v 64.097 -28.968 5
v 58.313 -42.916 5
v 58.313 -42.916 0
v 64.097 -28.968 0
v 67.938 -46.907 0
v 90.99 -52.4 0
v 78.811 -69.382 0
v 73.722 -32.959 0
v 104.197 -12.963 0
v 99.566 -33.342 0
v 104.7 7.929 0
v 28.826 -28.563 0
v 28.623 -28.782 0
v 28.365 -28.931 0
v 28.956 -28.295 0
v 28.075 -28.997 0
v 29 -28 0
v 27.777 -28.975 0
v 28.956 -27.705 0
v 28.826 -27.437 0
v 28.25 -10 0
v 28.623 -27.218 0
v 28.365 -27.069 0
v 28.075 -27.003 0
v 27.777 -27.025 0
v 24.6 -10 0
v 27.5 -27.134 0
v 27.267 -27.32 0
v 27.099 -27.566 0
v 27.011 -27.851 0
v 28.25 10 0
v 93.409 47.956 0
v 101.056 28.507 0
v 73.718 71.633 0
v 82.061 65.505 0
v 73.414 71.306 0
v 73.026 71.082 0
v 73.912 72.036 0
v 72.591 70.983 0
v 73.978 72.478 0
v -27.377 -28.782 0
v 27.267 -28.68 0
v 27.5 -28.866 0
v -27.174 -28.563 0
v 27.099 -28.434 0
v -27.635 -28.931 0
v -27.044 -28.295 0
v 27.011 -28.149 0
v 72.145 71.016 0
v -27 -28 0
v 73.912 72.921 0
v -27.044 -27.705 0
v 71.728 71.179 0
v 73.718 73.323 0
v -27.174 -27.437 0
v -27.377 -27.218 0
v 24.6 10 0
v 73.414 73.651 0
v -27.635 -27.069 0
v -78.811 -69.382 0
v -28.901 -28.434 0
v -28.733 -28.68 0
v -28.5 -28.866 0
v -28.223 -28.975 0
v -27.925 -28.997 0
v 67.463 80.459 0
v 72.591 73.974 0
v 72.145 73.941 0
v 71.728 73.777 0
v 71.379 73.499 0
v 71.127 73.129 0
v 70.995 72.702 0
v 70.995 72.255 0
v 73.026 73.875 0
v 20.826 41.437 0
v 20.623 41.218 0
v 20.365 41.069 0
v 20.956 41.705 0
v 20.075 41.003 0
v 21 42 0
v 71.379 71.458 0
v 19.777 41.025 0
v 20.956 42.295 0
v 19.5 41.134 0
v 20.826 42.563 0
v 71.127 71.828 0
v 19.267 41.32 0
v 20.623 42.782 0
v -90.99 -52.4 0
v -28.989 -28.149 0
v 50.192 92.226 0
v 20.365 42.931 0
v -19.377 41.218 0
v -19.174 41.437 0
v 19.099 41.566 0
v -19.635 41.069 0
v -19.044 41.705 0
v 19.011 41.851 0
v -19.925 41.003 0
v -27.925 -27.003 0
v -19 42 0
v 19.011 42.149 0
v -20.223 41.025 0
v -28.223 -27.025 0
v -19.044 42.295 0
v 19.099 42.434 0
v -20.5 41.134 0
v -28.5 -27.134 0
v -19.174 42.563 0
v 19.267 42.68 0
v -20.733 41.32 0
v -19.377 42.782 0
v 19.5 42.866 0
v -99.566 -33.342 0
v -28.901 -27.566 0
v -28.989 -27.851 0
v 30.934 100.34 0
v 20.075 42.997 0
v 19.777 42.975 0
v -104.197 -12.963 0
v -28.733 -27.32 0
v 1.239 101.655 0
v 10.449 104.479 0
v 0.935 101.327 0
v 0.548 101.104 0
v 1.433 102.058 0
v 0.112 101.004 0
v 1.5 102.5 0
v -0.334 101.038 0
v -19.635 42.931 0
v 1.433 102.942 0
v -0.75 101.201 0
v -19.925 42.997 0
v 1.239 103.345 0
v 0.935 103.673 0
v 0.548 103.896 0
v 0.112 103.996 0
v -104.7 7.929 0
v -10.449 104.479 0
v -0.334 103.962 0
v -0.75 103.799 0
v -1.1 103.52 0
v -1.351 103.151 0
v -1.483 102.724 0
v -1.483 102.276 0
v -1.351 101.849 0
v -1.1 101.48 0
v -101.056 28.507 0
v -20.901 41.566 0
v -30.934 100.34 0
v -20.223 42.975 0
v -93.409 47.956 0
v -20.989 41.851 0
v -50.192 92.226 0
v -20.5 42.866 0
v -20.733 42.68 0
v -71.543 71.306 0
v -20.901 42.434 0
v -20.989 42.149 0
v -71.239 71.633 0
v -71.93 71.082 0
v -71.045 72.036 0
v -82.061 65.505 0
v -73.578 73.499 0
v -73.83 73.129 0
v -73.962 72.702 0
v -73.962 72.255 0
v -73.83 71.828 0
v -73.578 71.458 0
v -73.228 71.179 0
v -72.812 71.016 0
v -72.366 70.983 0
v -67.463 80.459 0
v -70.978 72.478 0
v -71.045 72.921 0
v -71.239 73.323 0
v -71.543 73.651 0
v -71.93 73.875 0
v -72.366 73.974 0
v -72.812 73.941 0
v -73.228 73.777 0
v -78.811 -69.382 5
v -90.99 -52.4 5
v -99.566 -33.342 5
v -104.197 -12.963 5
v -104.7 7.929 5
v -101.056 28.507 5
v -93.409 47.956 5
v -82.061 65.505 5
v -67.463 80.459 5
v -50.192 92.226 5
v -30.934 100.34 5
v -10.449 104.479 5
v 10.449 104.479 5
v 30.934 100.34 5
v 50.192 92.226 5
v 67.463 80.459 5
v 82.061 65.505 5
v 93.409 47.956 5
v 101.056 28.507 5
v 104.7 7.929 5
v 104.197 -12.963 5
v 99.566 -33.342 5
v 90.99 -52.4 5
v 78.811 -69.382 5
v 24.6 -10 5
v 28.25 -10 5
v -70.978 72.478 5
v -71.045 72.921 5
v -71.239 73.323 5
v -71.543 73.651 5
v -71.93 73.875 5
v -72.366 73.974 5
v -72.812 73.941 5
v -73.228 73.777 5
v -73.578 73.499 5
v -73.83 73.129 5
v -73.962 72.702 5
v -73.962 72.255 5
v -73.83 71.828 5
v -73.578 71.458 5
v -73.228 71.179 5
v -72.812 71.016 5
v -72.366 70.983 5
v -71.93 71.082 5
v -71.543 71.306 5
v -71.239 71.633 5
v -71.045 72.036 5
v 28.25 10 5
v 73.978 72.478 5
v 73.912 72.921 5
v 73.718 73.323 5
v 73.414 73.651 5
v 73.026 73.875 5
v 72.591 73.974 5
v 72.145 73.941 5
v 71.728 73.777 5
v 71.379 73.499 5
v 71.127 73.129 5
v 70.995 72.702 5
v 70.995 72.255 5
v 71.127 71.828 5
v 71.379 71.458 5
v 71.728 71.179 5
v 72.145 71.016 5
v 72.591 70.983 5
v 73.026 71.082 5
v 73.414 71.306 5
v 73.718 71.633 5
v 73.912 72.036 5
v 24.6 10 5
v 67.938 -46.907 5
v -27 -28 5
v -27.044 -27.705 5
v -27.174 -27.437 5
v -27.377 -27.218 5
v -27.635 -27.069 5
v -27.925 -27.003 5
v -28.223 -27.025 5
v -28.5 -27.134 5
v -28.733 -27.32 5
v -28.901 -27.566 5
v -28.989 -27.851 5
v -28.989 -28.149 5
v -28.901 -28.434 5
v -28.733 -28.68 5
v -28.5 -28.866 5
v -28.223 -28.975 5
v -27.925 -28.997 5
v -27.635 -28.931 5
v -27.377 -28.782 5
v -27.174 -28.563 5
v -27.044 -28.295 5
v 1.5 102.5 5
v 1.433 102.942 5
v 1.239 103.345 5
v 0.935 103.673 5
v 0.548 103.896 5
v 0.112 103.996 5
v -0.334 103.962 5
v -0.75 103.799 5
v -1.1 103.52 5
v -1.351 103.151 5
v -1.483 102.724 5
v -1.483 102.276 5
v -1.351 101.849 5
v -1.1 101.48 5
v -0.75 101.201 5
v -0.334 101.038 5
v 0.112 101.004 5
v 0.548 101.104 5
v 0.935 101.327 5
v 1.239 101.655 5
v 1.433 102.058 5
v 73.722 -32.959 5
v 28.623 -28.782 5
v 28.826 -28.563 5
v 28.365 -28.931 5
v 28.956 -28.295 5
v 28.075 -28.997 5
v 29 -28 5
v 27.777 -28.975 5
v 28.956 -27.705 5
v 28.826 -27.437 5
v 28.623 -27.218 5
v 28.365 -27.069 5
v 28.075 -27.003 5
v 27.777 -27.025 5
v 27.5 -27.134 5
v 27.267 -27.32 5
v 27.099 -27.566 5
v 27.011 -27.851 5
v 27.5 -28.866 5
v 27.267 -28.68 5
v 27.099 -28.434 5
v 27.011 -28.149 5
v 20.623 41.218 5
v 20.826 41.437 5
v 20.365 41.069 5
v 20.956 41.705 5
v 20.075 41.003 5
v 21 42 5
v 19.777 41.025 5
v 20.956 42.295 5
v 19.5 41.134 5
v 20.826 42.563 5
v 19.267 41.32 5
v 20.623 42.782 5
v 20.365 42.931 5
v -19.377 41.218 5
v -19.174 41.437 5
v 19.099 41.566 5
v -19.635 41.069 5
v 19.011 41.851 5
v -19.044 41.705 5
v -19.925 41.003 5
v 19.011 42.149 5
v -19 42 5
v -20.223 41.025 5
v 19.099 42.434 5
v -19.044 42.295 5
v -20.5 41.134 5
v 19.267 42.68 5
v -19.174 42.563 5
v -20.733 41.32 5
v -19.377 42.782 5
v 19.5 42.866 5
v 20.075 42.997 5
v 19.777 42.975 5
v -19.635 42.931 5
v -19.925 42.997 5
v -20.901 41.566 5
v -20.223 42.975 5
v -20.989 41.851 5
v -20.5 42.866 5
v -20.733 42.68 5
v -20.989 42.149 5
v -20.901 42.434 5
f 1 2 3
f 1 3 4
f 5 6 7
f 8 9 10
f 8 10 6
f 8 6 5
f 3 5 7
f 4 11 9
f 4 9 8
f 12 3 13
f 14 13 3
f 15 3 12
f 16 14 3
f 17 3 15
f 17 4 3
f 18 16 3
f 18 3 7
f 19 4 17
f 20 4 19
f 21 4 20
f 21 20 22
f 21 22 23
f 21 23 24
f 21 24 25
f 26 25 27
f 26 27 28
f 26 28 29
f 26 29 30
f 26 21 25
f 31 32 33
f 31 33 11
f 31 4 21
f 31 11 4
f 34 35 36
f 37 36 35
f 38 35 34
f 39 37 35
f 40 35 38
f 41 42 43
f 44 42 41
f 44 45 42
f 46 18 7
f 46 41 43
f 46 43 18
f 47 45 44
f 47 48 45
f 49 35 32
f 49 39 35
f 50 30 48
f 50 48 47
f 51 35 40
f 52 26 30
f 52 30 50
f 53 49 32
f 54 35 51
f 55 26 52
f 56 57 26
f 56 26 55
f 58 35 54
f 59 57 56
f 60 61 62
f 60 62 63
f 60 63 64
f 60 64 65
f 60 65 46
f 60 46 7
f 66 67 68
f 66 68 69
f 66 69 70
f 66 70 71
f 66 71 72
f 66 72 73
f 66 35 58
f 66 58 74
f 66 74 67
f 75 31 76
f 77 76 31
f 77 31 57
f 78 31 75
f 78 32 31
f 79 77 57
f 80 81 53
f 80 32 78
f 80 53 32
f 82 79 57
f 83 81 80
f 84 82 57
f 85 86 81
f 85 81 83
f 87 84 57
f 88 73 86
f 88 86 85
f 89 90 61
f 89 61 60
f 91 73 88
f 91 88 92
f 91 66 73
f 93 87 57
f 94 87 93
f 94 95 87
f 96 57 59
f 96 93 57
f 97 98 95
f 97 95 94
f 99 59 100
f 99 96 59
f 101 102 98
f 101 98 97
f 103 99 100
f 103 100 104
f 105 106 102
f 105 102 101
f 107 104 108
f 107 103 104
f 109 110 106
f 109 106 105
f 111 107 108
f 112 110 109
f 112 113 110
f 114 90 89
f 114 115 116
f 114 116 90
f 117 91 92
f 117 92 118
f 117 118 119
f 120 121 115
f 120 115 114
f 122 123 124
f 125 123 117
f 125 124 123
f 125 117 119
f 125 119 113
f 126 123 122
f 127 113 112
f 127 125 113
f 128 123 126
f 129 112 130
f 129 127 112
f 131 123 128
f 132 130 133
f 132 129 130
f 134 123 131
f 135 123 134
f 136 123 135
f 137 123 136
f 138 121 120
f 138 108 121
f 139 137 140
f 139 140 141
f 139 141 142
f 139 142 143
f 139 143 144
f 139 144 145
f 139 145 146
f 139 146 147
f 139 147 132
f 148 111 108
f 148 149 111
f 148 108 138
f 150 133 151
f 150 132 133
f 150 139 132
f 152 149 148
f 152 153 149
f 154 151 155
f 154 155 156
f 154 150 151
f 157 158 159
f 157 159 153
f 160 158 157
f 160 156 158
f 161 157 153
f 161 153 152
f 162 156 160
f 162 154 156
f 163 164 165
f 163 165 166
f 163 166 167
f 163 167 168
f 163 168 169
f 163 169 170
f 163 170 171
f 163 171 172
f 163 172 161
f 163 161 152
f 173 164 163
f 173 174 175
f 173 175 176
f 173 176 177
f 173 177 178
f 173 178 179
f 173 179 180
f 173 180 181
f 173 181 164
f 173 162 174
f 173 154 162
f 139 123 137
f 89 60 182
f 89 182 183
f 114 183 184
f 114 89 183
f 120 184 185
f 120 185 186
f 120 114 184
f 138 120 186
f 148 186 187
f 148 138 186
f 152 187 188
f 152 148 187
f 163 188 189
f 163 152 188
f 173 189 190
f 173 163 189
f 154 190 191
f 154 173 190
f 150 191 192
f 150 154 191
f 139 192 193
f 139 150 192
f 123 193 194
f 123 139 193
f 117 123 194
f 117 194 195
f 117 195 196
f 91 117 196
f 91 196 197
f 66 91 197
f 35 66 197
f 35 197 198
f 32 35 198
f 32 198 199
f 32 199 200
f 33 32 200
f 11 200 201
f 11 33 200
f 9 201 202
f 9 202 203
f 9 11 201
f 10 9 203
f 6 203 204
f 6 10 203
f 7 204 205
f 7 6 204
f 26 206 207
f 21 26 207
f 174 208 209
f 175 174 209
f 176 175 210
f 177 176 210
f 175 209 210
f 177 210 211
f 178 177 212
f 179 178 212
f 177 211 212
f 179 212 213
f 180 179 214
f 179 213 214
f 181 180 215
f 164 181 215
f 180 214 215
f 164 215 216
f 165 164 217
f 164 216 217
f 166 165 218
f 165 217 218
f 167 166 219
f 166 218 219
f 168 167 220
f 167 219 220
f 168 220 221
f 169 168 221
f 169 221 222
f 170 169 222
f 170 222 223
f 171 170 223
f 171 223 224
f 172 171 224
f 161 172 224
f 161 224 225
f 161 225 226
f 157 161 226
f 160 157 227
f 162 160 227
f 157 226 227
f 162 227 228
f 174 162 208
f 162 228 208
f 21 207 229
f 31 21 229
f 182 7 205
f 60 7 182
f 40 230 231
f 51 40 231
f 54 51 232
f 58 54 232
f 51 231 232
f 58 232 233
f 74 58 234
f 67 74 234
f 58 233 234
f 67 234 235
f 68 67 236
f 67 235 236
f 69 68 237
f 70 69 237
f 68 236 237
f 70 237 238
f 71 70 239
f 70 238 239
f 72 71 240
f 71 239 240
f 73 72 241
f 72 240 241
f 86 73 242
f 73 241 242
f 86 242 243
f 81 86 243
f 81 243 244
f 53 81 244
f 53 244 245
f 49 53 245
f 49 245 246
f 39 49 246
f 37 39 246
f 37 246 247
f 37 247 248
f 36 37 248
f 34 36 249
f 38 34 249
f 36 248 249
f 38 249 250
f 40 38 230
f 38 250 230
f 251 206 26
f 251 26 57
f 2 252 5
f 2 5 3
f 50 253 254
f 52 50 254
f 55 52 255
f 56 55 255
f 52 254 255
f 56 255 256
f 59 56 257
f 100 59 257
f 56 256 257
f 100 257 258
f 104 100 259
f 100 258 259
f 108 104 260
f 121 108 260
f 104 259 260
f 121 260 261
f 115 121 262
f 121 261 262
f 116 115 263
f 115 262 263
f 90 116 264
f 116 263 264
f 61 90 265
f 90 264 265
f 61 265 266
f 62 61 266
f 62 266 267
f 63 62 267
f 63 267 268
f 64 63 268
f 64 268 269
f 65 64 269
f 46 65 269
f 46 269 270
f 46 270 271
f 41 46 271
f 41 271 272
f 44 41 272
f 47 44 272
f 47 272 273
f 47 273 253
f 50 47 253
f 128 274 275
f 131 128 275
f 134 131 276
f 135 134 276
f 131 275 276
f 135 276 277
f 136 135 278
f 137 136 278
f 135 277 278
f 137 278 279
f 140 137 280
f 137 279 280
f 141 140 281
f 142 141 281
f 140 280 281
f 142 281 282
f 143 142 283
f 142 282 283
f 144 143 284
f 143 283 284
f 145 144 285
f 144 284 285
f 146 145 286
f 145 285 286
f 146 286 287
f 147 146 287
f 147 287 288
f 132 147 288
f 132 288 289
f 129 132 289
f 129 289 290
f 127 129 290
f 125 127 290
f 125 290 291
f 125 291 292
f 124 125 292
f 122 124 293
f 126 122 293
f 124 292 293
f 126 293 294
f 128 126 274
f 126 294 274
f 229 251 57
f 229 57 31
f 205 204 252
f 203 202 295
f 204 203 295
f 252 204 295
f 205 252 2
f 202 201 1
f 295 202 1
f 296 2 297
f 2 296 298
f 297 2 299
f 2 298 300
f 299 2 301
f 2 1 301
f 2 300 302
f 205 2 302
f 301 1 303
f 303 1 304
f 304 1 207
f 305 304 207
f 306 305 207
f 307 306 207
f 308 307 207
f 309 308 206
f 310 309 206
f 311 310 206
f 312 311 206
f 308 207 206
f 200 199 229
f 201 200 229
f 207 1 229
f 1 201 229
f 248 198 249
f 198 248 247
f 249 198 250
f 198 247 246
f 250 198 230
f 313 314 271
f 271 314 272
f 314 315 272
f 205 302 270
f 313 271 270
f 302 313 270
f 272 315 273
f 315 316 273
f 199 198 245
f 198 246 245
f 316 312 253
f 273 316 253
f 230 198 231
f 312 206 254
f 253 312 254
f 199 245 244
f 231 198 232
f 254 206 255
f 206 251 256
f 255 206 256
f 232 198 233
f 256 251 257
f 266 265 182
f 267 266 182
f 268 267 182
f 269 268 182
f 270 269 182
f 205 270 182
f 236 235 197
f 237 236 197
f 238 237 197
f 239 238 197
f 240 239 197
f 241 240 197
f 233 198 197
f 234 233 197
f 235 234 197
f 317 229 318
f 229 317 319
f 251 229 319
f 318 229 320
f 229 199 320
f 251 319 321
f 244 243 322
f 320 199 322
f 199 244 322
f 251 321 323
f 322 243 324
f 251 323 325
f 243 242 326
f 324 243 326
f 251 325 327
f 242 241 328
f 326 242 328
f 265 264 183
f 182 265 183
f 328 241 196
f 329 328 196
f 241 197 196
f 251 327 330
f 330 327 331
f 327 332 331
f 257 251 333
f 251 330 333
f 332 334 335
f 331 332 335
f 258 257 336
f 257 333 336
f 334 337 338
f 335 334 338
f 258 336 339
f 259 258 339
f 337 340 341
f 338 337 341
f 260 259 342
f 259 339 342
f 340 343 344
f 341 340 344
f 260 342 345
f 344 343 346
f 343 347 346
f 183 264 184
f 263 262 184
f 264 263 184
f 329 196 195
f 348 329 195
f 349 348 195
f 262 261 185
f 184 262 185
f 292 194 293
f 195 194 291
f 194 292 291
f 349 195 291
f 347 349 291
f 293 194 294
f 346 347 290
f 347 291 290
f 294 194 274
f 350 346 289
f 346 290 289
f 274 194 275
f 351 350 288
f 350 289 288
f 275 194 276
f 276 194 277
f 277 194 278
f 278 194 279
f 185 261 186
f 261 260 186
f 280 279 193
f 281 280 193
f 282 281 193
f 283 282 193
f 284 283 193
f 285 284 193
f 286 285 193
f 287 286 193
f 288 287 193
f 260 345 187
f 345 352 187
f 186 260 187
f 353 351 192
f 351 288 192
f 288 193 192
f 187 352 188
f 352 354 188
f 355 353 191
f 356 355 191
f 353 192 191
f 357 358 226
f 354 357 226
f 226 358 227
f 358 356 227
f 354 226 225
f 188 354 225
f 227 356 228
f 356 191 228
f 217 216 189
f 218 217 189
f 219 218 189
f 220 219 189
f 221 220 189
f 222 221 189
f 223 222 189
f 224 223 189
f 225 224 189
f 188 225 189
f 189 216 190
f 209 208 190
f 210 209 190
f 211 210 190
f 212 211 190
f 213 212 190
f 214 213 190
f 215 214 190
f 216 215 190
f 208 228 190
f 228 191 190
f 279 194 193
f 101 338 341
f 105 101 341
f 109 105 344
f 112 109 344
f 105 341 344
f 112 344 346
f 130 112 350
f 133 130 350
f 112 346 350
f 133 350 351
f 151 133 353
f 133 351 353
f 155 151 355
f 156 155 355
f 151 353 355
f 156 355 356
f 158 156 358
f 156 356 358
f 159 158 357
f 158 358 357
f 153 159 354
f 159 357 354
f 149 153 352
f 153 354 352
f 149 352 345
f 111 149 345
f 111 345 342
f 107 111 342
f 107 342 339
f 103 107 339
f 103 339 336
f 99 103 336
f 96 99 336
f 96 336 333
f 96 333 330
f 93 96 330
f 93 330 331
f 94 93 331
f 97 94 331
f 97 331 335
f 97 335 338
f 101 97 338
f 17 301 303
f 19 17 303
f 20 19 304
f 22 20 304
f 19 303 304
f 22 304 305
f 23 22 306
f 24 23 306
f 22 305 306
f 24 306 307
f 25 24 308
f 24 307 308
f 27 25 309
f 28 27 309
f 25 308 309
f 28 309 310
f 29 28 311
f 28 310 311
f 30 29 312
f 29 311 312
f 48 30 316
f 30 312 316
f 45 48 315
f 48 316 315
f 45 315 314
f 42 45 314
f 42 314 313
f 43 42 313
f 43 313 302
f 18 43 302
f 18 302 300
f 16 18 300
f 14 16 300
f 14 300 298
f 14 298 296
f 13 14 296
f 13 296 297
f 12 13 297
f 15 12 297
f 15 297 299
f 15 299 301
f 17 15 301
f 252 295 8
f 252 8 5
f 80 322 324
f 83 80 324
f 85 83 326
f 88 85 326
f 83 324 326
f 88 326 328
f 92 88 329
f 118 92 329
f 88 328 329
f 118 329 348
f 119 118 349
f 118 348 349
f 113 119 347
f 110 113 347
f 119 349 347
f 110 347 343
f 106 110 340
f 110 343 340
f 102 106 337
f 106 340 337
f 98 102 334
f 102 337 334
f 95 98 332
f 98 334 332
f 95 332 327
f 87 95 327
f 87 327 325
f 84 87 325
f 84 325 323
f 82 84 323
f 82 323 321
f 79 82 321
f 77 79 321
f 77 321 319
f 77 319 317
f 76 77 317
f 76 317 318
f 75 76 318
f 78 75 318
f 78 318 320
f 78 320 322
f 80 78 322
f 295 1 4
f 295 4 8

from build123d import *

# Parameters (mm, degrees)
BOSS_EXTRU_1_DEPTH      = 5
ESQUISSE2_R             = 1.5
ENL_V_MAT_EXTRU_1_DEPTH = 5
ESQUISSE3_R             = 1
ENL_V_MAT_EXTRU_2_DEPTH = 149.576579581
ENL_V_MAT_EXTRU_3_DEPTH = 149.576579581
ESQUISSE5_W             = 3.649999998
ESQUISSE5_H             = 20
ENL_V_MAT_EXTRU_4_DEPTH = 149.576579581


with BuildPart() as part:
    # Esquisse1 → Boss.-Extru.1 (new body)
    with BuildSketch(Plane.XY):
        with BuildLine():
            Line((78.81072608, -69.38205427), (-78.81072608, -69.38205427))
            ThreePointArc((-78.81072608, -69.38205427), (0, 105), (78.81072608, -69.38205427))
        make_face()
    extrude(amount=BOSS_EXTRU_1_DEPTH)

    # Esquisse2 → Enlèv. mat.-Extru.1 (cut)
    with BuildSketch(Plane.XY.offset(5)):
        with Locations((0, 102.5)):
            Circle(ESQUISSE2_R)
        with Locations((72.478445072, 72.478445072)):
            Circle(ESQUISSE2_R)
        with Locations((-72.478445072, 72.478445072)):
            Circle(ESQUISSE2_R)
    extrude(amount=-ENL_V_MAT_EXTRU_1_DEPTH, mode=Mode.SUBTRACT)

    # Esquisse3 → Enlèv. mat.-Extru.2 (cut, through all)
    with BuildSketch(Plane.XY.offset(5)):
        with Locations((20.000000004, 41.999999998)):
            Circle(ESQUISSE3_R)
        with Locations((-19.999999996, 42.000000002)):
            Circle(ESQUISSE3_R)
        with Locations((-28.000000003, -27.999999997)):
            Circle(ESQUISSE3_R)
        with Locations((27.999999997, -28.000000003)):
            Circle(ESQUISSE3_R)
    extrude(amount=-ENL_V_MAT_EXTRU_2_DEPTH, mode=Mode.SUBTRACT)

    # Esquisse4 → Enlèv. mat.-Extru.3 (cut, through all)
    with BuildSketch(Plane.XY.offset(5)):
        Polygon((58.312515902, -42.91606585), (64.096555924, -28.967772728), (73.721801907, -32.959143392), (67.937761885, -46.907436514), align=None)
    extrude(amount=-ENL_V_MAT_EXTRU_3_DEPTH, mode=Mode.SUBTRACT)

    # Esquisse5 → Enlèv. mat.-Extru.4 (cut, through all)
    with BuildSketch(Plane.XY.offset(5)):
        with Locations((26.425, -3e-09)):
            Rectangle(ESQUISSE5_W, ESQUISSE5_H)
    extrude(amount=-ENL_V_MAT_EXTRU_4_DEPTH, mode=Mode.SUBTRACT)


solid = part.part
